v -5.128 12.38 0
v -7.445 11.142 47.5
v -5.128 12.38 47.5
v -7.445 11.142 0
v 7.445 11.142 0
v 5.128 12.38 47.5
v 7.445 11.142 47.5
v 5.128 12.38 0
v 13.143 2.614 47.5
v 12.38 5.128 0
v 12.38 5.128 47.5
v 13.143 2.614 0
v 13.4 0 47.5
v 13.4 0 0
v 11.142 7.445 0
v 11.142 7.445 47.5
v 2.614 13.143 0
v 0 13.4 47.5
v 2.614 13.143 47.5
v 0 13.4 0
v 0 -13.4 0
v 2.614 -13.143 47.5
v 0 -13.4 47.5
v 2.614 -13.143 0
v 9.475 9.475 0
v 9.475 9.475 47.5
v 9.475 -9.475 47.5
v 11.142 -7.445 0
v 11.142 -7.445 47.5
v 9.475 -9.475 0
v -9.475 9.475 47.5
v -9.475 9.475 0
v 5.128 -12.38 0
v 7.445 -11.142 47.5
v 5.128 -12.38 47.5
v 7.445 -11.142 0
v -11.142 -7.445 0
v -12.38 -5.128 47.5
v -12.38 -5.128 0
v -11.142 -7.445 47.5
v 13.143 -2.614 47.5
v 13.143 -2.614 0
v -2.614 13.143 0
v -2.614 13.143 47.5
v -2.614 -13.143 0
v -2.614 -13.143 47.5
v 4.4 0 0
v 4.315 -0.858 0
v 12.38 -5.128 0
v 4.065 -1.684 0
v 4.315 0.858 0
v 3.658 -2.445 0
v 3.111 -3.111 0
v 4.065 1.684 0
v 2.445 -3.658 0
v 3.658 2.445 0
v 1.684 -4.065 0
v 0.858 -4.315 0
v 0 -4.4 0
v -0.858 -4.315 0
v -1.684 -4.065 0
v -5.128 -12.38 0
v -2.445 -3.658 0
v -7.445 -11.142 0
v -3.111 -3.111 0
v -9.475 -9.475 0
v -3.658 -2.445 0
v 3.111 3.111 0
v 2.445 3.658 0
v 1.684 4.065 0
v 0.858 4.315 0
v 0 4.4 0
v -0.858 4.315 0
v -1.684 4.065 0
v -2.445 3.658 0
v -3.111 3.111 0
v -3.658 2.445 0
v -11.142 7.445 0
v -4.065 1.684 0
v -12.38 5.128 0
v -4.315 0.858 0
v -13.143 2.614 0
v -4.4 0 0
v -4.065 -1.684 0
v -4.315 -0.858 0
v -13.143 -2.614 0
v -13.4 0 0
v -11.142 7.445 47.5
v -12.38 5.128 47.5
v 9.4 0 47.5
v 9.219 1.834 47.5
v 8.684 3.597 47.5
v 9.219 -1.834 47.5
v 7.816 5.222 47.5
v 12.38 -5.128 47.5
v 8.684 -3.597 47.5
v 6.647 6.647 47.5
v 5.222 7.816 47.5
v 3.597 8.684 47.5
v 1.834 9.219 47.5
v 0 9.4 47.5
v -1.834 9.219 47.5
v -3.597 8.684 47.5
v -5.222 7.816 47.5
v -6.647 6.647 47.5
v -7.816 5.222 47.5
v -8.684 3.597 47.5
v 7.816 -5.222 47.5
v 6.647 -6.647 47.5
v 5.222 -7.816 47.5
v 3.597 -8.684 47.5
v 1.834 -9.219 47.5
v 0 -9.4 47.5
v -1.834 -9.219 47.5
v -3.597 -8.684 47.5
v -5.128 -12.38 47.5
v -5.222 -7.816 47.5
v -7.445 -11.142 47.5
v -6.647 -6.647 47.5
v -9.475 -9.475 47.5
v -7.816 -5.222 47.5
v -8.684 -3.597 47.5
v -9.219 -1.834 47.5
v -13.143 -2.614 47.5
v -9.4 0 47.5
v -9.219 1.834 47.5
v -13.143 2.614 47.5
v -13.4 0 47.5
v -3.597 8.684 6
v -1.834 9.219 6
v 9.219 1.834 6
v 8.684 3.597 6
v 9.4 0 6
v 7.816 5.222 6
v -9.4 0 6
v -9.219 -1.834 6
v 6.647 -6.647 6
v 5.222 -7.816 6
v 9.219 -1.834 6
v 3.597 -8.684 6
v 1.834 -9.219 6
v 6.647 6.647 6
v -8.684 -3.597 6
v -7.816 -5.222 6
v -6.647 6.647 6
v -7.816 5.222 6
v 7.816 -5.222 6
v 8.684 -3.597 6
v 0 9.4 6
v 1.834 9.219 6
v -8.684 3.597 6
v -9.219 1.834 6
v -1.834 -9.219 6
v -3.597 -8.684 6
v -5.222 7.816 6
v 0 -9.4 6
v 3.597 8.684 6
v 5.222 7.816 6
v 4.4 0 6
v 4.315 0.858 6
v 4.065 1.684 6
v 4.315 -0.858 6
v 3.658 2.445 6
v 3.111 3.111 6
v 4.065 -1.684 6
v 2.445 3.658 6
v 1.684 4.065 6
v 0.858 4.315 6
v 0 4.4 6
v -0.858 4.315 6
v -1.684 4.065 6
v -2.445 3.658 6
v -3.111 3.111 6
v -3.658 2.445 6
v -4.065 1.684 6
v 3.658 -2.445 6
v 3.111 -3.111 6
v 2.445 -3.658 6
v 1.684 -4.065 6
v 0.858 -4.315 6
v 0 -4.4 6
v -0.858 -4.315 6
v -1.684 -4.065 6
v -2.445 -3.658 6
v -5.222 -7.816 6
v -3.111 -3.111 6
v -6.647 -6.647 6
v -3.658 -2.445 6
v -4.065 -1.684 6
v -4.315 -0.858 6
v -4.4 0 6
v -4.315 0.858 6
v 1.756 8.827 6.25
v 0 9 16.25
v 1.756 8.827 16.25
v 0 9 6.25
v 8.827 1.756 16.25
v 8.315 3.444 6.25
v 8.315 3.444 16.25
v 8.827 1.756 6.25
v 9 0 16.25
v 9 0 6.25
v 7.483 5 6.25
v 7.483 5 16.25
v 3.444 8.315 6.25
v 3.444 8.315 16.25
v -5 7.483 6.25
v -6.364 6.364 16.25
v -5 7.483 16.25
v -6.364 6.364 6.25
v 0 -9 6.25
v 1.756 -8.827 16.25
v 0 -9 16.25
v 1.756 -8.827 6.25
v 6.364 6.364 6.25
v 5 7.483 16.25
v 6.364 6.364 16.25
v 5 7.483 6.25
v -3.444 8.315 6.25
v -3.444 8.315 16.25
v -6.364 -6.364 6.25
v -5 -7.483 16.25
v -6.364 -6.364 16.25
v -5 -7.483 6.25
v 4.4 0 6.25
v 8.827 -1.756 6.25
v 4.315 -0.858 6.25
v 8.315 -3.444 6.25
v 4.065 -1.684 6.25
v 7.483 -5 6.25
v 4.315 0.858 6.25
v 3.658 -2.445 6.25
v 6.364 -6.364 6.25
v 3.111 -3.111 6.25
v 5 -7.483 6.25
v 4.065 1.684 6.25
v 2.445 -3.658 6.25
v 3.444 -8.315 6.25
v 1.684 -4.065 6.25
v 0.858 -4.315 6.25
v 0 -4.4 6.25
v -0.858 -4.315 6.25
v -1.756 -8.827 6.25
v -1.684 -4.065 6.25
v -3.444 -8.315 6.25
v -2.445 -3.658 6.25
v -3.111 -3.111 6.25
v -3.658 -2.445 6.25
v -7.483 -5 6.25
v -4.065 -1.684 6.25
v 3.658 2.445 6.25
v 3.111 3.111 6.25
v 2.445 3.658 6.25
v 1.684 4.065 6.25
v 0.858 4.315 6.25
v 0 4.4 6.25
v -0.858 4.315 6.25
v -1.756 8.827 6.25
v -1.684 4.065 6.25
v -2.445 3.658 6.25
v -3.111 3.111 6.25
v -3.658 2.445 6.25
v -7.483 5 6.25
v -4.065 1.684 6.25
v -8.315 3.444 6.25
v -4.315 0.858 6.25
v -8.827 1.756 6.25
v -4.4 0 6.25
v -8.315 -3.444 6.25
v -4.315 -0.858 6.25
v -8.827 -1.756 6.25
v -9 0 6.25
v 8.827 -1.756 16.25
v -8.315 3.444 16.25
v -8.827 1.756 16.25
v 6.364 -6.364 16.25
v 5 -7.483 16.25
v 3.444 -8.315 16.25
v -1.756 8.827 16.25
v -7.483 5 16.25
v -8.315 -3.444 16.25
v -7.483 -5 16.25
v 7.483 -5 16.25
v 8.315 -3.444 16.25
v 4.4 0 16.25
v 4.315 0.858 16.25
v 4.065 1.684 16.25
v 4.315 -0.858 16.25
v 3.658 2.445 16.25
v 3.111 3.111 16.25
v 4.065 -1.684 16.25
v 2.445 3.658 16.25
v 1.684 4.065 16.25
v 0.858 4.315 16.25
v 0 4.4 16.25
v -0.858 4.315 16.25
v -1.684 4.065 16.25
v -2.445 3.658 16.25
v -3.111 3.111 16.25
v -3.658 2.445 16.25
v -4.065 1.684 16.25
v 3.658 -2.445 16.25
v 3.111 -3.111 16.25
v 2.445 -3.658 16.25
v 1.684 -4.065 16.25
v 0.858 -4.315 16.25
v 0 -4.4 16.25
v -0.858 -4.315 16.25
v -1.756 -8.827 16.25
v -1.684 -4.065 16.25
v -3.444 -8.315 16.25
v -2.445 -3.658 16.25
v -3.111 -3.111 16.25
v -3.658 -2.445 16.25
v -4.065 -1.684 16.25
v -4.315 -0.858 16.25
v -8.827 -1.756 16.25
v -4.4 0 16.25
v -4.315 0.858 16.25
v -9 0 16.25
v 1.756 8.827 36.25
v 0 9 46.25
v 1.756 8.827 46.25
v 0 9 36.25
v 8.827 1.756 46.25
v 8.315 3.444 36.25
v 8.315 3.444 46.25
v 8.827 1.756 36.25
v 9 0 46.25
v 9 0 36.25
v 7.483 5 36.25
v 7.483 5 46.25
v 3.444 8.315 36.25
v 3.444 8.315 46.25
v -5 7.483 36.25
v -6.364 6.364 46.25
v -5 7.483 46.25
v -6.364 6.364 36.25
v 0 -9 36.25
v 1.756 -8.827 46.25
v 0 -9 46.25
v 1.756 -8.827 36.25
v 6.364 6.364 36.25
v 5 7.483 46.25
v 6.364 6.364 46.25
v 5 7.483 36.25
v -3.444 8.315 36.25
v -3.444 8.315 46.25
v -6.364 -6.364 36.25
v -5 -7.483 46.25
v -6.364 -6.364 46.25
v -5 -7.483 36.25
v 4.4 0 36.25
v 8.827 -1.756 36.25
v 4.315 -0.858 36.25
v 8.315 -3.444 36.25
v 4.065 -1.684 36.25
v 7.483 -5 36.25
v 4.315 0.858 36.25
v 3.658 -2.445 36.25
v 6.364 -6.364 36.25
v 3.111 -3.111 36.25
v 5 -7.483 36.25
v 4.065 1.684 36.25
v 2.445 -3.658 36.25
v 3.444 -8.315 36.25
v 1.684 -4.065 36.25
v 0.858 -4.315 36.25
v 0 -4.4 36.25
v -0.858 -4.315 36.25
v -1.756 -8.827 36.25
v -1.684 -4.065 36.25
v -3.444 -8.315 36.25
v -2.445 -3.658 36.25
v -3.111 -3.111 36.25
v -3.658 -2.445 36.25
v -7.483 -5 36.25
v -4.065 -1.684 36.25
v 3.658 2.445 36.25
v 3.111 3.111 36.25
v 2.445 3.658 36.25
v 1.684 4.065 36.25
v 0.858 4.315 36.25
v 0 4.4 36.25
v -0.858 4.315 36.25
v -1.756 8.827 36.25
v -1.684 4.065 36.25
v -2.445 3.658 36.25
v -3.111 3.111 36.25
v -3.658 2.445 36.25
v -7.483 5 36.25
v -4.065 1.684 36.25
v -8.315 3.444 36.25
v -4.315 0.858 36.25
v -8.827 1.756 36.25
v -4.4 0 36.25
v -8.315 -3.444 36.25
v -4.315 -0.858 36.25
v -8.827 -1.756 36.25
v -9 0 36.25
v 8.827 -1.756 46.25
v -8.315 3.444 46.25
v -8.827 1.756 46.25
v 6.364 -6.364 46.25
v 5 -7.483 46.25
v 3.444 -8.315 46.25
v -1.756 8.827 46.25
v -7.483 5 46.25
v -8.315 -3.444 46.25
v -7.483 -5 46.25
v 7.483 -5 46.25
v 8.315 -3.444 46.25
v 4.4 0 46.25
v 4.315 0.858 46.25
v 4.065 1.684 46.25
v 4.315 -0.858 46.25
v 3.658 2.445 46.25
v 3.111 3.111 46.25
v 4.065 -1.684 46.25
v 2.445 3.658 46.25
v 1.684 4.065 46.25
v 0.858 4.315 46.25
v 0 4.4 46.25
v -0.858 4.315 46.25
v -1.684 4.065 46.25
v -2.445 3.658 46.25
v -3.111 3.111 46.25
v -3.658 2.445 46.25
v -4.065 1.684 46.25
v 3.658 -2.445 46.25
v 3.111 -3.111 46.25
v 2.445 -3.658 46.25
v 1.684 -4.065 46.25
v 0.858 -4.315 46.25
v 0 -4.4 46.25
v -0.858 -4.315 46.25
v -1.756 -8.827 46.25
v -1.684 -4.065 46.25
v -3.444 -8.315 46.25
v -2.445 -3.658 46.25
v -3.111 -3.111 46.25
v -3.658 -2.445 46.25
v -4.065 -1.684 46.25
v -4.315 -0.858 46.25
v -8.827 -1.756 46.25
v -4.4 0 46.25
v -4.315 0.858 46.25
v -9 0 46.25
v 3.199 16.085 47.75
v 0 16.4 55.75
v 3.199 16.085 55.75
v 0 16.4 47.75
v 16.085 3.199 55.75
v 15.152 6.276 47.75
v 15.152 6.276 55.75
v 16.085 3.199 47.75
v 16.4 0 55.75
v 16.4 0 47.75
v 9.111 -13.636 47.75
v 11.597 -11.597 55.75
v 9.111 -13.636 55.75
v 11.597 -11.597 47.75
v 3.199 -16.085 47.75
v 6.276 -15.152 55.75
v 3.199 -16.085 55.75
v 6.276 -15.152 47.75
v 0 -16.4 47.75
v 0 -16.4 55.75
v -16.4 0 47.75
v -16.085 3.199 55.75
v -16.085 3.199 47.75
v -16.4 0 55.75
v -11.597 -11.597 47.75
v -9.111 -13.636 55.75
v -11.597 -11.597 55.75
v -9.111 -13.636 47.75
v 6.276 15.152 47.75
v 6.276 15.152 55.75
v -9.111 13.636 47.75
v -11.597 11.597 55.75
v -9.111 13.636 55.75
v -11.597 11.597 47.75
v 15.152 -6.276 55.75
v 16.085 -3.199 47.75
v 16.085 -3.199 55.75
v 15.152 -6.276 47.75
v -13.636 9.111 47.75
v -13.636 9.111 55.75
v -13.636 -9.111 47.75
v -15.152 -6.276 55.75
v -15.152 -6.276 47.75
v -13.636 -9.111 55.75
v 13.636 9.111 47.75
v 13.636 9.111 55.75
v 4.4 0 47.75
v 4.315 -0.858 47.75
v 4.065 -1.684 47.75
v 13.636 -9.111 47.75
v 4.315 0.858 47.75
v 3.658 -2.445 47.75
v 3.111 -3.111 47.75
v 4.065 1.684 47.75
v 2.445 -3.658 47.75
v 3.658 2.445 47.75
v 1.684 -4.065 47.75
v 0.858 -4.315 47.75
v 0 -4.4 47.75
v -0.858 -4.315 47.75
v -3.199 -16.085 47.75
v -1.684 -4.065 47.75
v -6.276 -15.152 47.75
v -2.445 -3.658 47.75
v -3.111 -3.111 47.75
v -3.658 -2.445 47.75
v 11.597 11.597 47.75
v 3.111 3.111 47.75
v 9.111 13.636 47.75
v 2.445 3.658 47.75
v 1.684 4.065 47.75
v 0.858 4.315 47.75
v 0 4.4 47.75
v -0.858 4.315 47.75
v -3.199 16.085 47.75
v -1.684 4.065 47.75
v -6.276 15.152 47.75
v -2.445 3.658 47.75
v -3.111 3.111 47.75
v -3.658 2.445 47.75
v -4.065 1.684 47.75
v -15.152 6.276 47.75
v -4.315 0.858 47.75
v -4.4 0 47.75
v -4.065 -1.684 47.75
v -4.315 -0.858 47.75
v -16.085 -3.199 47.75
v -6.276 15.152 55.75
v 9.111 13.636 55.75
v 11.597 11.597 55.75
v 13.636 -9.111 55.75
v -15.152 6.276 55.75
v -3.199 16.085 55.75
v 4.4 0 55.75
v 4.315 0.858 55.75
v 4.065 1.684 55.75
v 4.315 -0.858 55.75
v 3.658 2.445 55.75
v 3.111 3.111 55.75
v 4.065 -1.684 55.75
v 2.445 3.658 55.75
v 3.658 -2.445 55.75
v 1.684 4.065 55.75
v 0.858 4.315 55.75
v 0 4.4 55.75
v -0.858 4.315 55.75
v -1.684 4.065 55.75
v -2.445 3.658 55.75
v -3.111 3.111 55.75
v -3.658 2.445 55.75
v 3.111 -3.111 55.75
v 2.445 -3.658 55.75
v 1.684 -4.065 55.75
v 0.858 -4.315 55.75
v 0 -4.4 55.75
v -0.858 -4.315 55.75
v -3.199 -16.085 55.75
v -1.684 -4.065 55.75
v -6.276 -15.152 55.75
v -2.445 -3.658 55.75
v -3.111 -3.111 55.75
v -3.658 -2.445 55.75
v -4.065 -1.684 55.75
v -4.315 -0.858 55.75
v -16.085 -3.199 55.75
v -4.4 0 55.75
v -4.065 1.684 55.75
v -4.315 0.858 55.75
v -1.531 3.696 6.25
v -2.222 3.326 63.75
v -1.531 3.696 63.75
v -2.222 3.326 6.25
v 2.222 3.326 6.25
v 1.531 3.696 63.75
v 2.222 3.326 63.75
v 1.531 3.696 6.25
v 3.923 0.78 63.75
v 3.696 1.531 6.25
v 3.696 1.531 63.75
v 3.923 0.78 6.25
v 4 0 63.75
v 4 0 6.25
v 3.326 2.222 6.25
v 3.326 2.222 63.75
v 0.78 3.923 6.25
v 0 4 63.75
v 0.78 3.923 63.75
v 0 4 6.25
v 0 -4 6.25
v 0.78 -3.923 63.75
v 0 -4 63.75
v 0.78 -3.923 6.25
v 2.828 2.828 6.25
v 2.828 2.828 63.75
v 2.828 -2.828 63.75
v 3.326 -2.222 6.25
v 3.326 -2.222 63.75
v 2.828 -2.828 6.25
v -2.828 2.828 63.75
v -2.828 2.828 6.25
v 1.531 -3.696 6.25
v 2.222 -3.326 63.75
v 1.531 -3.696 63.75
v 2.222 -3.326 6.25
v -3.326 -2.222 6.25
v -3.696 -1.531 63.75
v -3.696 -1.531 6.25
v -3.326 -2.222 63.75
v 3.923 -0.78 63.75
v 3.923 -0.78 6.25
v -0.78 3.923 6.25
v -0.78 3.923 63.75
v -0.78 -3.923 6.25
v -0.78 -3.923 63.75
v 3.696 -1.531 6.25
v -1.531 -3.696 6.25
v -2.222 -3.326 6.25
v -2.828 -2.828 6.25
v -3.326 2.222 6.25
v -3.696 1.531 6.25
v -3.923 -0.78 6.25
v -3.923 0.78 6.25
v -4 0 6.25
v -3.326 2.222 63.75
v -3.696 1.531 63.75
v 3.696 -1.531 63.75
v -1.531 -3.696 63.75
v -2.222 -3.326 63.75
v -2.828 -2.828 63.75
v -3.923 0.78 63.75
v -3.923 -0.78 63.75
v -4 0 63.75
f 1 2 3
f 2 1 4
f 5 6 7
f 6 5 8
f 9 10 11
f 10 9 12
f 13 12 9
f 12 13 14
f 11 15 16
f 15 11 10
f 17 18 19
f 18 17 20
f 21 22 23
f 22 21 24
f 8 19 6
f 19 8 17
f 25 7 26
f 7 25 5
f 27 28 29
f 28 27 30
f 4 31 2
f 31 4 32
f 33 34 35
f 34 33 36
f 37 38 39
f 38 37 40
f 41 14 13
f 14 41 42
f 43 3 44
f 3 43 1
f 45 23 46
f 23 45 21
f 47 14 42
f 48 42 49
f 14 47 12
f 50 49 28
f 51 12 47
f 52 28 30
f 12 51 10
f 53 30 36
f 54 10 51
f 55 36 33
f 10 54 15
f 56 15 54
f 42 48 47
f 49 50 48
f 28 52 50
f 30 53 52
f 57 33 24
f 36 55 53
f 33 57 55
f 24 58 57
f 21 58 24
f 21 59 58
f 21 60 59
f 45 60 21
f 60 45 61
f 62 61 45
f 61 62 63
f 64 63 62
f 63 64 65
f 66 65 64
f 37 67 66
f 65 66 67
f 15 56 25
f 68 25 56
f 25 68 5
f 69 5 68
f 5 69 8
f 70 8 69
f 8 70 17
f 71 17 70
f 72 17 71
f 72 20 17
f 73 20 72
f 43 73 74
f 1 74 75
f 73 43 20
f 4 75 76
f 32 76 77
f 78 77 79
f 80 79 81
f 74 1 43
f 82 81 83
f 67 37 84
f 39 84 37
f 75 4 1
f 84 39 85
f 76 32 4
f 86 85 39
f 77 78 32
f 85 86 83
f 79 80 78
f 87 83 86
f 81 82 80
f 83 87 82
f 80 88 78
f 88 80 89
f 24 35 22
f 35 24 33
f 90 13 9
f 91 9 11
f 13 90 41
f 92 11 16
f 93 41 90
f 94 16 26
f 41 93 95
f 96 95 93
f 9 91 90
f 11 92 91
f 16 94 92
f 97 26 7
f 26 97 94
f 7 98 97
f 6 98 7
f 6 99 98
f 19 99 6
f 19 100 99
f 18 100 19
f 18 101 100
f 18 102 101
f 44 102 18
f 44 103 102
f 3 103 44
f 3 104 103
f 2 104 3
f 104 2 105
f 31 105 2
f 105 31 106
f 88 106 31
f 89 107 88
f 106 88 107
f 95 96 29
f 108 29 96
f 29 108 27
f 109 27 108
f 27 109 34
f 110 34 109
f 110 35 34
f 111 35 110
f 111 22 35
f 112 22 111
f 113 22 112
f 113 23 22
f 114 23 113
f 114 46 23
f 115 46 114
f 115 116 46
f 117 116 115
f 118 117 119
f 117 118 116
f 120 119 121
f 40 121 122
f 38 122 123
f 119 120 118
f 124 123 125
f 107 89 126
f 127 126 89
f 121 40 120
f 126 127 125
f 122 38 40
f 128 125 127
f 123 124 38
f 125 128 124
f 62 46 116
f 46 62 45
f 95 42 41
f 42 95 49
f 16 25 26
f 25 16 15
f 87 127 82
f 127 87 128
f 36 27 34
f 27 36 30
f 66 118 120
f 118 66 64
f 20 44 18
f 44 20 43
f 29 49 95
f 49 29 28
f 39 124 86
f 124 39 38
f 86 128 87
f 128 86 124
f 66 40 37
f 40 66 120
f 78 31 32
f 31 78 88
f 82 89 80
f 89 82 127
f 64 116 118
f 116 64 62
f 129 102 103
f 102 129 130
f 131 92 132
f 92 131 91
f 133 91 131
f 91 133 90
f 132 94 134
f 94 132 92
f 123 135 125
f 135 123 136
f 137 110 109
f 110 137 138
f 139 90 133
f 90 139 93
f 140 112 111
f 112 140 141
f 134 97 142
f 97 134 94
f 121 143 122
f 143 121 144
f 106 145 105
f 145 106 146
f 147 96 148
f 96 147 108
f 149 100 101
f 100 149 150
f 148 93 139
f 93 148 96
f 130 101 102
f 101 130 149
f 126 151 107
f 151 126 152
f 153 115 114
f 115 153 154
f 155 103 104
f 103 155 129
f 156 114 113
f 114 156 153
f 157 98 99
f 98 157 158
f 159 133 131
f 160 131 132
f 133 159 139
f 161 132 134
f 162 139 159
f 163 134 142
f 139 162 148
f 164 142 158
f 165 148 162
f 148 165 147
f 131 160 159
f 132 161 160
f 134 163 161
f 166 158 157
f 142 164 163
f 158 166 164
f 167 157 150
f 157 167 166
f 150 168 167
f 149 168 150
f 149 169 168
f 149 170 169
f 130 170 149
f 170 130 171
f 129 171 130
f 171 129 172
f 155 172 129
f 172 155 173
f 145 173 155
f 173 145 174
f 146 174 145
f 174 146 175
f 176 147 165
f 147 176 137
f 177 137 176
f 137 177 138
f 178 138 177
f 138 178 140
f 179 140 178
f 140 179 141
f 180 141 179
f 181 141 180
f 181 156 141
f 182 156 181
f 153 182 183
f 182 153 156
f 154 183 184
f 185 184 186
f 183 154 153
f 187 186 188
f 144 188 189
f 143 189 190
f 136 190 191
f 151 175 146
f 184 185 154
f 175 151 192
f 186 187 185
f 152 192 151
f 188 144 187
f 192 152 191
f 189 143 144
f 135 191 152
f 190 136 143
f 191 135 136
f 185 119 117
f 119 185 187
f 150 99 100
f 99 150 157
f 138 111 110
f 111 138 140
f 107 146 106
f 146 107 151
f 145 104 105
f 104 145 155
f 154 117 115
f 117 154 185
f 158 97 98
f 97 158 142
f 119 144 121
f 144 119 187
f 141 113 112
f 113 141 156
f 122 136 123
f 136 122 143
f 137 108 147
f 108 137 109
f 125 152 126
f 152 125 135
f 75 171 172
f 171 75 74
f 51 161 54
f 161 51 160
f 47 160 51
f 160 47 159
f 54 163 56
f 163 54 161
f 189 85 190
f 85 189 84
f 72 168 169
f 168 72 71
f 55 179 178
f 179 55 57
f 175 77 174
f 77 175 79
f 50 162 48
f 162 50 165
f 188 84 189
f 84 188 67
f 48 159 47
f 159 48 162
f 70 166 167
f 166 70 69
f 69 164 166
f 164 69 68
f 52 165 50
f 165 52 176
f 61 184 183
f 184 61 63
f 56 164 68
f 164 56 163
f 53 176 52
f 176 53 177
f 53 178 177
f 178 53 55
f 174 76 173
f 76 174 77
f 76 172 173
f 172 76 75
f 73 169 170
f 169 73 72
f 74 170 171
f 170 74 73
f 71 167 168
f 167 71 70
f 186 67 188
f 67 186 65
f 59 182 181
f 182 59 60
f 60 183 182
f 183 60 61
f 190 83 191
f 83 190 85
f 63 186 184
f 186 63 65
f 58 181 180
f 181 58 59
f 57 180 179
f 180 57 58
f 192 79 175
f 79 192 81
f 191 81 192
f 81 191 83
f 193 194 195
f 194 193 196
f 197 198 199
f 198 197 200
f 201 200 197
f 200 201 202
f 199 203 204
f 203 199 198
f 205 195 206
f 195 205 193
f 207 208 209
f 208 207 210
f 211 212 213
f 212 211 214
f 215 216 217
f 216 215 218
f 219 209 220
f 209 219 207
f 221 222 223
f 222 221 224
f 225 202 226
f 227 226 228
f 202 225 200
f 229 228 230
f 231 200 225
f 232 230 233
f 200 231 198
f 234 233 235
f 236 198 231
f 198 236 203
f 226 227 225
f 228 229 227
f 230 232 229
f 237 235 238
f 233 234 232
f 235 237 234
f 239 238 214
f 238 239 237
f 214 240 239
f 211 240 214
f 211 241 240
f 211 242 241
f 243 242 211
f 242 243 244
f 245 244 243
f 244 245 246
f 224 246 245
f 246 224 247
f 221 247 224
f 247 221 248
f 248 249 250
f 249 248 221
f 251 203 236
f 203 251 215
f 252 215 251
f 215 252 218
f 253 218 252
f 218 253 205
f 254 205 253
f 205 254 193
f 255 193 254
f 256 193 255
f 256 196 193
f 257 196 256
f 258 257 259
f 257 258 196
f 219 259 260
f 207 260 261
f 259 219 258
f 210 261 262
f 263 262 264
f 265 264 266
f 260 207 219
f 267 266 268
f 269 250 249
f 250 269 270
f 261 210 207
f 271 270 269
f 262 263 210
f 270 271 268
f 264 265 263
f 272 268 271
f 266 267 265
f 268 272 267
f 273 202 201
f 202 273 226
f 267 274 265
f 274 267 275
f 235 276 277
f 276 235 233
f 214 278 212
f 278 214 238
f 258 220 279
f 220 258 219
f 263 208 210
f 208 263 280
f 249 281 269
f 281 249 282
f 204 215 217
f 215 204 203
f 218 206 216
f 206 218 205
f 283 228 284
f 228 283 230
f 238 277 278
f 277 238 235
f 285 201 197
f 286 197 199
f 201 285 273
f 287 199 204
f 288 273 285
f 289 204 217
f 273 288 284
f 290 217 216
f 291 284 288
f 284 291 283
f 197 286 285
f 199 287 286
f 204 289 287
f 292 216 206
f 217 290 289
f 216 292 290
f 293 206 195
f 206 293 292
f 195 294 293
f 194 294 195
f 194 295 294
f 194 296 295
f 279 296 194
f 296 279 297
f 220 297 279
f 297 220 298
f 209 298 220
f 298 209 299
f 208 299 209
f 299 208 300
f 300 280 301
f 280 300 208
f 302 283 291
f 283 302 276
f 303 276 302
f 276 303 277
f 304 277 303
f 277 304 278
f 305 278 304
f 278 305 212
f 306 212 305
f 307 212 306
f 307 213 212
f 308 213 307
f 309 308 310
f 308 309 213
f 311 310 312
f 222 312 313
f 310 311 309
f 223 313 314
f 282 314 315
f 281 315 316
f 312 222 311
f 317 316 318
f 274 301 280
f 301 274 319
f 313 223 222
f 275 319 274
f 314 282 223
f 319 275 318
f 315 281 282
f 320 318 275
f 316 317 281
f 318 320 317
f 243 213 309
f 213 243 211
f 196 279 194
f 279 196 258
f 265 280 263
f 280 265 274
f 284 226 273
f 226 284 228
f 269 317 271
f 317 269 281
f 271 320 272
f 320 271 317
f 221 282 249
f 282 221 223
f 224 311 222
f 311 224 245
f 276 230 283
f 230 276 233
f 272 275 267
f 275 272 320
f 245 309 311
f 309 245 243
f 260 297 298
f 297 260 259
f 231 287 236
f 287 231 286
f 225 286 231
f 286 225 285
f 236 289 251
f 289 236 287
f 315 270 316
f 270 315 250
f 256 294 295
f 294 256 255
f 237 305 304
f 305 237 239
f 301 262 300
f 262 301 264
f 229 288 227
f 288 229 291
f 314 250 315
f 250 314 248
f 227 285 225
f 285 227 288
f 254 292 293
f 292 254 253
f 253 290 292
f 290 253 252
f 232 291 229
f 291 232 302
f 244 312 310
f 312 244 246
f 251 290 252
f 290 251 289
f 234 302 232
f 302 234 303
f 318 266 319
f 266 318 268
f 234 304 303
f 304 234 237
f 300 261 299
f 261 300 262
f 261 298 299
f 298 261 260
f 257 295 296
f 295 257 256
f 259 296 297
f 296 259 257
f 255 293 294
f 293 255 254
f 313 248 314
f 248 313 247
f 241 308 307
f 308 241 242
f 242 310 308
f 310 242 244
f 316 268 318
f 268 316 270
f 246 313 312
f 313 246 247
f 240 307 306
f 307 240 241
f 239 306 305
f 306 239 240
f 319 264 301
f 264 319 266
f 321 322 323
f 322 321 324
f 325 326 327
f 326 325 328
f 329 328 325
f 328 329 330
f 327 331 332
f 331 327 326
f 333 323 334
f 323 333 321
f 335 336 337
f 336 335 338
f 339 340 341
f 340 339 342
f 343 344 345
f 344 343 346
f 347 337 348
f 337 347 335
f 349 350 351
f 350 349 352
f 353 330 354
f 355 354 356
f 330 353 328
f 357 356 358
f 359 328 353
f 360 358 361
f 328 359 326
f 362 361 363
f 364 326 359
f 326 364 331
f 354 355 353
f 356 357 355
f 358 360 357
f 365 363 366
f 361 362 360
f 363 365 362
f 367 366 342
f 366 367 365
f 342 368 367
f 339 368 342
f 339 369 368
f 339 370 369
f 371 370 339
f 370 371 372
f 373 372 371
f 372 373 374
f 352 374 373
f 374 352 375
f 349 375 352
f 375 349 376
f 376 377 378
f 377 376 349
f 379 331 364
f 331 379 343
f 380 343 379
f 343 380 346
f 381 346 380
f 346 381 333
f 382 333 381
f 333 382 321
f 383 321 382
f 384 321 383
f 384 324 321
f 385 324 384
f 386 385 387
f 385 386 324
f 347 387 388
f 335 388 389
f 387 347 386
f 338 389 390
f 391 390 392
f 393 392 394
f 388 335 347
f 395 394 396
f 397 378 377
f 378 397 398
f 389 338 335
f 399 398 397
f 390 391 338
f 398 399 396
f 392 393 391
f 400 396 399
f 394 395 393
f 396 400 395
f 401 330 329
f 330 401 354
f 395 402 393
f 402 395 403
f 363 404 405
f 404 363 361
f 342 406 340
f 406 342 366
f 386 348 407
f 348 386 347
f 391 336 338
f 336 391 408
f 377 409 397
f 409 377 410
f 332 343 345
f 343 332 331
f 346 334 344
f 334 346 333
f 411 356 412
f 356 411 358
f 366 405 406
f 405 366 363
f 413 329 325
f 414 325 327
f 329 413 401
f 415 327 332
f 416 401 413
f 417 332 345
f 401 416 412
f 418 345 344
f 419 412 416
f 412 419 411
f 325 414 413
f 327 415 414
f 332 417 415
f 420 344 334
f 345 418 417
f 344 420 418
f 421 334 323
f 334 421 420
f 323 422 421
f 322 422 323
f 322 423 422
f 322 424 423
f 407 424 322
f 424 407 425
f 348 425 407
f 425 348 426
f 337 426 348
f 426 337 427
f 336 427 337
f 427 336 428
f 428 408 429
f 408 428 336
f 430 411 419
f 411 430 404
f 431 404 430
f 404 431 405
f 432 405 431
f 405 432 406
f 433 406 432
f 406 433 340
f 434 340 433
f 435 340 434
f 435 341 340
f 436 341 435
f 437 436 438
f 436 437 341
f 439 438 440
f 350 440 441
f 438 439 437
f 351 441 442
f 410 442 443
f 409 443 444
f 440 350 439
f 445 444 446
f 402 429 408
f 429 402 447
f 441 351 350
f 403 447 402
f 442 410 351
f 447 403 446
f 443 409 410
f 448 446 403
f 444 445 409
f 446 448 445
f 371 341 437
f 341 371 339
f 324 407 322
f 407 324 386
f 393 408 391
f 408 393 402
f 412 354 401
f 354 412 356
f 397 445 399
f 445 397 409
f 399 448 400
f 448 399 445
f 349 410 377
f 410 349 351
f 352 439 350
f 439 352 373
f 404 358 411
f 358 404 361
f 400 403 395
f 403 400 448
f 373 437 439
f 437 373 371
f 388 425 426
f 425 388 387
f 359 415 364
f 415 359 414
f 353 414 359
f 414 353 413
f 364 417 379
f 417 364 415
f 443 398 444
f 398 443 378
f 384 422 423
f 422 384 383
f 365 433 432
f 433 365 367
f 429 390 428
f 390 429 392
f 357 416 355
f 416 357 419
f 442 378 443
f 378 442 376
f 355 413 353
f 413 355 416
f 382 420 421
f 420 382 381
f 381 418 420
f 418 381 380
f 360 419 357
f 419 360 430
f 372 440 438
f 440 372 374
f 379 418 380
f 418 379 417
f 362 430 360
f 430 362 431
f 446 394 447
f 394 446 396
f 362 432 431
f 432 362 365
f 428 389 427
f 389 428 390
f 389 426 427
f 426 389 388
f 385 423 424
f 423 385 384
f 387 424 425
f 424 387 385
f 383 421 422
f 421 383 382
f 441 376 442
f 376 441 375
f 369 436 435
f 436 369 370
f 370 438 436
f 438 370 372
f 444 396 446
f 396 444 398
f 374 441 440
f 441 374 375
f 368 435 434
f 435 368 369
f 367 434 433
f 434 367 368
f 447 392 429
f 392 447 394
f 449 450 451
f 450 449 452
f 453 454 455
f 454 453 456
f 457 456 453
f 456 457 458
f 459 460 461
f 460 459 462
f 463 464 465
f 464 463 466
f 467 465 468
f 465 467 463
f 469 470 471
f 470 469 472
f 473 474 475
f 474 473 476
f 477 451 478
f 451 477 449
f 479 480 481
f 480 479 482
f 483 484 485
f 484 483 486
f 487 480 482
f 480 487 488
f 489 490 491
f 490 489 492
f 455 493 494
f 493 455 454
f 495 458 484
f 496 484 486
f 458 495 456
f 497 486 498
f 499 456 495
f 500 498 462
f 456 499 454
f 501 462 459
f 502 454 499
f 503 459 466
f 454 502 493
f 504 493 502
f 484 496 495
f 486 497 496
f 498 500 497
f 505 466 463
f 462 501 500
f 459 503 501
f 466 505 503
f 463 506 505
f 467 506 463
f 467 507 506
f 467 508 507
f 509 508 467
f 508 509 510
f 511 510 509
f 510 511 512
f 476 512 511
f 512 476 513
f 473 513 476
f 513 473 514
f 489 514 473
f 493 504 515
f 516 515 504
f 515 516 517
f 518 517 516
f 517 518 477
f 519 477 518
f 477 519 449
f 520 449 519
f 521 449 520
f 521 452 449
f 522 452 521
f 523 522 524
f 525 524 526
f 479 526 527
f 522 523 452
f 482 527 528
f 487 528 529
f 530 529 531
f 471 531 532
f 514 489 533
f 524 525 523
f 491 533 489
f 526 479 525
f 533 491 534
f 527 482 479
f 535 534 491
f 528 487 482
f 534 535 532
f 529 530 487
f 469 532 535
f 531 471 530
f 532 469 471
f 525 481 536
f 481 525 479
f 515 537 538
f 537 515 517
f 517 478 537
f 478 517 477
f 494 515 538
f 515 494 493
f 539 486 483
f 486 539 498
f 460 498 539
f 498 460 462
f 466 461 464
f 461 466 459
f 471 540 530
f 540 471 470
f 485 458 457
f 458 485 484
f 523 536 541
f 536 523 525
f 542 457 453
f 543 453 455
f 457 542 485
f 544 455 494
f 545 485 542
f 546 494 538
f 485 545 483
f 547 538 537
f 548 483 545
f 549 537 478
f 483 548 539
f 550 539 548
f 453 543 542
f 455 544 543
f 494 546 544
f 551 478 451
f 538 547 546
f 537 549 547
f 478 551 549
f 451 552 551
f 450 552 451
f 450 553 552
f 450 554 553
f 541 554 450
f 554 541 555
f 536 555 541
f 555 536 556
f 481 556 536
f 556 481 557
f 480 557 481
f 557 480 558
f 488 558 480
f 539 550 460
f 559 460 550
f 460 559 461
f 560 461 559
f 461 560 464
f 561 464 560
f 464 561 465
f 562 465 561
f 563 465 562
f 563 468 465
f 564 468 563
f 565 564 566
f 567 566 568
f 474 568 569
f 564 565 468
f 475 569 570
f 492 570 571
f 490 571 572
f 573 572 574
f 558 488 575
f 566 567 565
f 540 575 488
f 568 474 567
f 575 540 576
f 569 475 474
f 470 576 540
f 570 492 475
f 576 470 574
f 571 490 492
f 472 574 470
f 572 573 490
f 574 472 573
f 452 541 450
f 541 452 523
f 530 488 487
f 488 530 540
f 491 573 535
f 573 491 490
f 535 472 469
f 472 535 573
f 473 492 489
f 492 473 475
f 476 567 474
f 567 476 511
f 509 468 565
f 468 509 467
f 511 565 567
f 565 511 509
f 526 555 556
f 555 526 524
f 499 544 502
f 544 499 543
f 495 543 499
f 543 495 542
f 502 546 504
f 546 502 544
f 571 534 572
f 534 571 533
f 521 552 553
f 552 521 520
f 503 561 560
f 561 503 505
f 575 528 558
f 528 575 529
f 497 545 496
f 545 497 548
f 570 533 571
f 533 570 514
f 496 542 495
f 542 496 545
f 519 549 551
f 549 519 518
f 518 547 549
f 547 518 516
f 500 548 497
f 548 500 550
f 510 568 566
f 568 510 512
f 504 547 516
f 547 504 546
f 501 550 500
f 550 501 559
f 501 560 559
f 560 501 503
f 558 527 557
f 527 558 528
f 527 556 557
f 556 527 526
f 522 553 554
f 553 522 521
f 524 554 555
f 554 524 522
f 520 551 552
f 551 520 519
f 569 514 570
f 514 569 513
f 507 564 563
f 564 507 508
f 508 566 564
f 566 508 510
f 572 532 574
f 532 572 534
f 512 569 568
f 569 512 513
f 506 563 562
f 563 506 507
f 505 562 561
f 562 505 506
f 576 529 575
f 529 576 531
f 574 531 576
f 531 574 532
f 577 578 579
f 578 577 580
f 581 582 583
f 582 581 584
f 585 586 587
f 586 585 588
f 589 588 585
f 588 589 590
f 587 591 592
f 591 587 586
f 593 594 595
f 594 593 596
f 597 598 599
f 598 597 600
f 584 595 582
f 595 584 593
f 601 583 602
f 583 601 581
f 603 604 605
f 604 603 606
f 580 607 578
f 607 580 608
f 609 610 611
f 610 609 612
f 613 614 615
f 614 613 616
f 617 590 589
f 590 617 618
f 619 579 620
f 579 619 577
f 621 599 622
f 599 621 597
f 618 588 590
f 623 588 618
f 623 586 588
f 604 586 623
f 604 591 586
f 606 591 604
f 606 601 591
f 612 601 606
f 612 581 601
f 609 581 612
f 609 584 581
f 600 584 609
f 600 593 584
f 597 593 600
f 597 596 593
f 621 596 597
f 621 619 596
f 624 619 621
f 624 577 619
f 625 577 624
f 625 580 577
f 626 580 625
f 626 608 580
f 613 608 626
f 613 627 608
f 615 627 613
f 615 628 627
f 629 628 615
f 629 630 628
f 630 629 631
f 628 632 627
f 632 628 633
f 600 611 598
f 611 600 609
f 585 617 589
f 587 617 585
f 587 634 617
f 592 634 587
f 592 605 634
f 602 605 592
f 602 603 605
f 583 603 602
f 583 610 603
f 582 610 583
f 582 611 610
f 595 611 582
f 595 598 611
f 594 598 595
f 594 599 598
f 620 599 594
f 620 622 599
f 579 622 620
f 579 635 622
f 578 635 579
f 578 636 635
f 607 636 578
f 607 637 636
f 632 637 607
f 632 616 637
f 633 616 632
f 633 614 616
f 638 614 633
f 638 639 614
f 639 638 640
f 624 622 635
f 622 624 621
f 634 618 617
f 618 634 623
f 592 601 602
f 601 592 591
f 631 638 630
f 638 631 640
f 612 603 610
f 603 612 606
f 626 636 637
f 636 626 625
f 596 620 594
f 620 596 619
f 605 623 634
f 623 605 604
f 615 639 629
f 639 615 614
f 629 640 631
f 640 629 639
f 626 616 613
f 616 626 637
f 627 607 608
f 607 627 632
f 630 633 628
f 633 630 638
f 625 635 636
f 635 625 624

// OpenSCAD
$fn = 32;

// ------------------------------------------------------------------------
// Shaft station: cup d26.8 x 47.5 mm, shaft d8
// Every part is its own module, assembly() places every instance.
// ------------------------------------------------------------------------

// --- part 1 ---
module housing_cup() {
  difference() {
    cylinder(h = 47.5, d = 26.8);
    translate([0, 0, 6]) cylinder(h = 42.5, d = 18.8);
    translate([0, 0, -1]) cylinder(h = 8, d = 8.8);
  }
}

// --- part 2 ---
module bearing_lower() {
  difference() {
      translate([0, 0, 0]) cylinder(h = 10, d = 18);
      translate([0, 0, -1]) cylinder(h = 12, d = 8.8);
    }
}

// --- part 3 ---
module bearing_upper() {
  difference() {
      translate([0, 0, 0]) cylinder(h = 10, d = 18);
      translate([0, 0, -1]) cylinder(h = 12, d = 8.8);
    }
}

// --- part 4 ---
module station_shaft() {
  translate([0, 0, -28.75]) cylinder(h = 57.5, d = 8);
}

// --- part 5 ---
module station_cover() {
  difference() {
    cylinder(h = 8, d = 32.8);
    translate([0, 0, -1]) cylinder(h = 10, d = 8.8);
  }
}

// --- assembly ---
module assembly() {
  color([0.80, 0.24, 0.20]) translate([0, 0, 0]) rotate([0, 0, 0]) housing_cup();
  color([0.20, 0.45, 0.75]) translate([0, 0, 6.25]) rotate([0, 0, 0]) bearing_lower();
  color([0.25, 0.62, 0.32]) translate([0, 0, 36.25]) rotate([0, 0, 0]) bearing_upper();
  color([0.92, 0.70, 0.18]) translate([0, 0, 35]) rotate([0, 0, 0]) station_shaft();
  color([0.58, 0.35, 0.70]) translate([0, 0, 47.75]) rotate([0, 0, 0]) station_cover();
}

assembly();
